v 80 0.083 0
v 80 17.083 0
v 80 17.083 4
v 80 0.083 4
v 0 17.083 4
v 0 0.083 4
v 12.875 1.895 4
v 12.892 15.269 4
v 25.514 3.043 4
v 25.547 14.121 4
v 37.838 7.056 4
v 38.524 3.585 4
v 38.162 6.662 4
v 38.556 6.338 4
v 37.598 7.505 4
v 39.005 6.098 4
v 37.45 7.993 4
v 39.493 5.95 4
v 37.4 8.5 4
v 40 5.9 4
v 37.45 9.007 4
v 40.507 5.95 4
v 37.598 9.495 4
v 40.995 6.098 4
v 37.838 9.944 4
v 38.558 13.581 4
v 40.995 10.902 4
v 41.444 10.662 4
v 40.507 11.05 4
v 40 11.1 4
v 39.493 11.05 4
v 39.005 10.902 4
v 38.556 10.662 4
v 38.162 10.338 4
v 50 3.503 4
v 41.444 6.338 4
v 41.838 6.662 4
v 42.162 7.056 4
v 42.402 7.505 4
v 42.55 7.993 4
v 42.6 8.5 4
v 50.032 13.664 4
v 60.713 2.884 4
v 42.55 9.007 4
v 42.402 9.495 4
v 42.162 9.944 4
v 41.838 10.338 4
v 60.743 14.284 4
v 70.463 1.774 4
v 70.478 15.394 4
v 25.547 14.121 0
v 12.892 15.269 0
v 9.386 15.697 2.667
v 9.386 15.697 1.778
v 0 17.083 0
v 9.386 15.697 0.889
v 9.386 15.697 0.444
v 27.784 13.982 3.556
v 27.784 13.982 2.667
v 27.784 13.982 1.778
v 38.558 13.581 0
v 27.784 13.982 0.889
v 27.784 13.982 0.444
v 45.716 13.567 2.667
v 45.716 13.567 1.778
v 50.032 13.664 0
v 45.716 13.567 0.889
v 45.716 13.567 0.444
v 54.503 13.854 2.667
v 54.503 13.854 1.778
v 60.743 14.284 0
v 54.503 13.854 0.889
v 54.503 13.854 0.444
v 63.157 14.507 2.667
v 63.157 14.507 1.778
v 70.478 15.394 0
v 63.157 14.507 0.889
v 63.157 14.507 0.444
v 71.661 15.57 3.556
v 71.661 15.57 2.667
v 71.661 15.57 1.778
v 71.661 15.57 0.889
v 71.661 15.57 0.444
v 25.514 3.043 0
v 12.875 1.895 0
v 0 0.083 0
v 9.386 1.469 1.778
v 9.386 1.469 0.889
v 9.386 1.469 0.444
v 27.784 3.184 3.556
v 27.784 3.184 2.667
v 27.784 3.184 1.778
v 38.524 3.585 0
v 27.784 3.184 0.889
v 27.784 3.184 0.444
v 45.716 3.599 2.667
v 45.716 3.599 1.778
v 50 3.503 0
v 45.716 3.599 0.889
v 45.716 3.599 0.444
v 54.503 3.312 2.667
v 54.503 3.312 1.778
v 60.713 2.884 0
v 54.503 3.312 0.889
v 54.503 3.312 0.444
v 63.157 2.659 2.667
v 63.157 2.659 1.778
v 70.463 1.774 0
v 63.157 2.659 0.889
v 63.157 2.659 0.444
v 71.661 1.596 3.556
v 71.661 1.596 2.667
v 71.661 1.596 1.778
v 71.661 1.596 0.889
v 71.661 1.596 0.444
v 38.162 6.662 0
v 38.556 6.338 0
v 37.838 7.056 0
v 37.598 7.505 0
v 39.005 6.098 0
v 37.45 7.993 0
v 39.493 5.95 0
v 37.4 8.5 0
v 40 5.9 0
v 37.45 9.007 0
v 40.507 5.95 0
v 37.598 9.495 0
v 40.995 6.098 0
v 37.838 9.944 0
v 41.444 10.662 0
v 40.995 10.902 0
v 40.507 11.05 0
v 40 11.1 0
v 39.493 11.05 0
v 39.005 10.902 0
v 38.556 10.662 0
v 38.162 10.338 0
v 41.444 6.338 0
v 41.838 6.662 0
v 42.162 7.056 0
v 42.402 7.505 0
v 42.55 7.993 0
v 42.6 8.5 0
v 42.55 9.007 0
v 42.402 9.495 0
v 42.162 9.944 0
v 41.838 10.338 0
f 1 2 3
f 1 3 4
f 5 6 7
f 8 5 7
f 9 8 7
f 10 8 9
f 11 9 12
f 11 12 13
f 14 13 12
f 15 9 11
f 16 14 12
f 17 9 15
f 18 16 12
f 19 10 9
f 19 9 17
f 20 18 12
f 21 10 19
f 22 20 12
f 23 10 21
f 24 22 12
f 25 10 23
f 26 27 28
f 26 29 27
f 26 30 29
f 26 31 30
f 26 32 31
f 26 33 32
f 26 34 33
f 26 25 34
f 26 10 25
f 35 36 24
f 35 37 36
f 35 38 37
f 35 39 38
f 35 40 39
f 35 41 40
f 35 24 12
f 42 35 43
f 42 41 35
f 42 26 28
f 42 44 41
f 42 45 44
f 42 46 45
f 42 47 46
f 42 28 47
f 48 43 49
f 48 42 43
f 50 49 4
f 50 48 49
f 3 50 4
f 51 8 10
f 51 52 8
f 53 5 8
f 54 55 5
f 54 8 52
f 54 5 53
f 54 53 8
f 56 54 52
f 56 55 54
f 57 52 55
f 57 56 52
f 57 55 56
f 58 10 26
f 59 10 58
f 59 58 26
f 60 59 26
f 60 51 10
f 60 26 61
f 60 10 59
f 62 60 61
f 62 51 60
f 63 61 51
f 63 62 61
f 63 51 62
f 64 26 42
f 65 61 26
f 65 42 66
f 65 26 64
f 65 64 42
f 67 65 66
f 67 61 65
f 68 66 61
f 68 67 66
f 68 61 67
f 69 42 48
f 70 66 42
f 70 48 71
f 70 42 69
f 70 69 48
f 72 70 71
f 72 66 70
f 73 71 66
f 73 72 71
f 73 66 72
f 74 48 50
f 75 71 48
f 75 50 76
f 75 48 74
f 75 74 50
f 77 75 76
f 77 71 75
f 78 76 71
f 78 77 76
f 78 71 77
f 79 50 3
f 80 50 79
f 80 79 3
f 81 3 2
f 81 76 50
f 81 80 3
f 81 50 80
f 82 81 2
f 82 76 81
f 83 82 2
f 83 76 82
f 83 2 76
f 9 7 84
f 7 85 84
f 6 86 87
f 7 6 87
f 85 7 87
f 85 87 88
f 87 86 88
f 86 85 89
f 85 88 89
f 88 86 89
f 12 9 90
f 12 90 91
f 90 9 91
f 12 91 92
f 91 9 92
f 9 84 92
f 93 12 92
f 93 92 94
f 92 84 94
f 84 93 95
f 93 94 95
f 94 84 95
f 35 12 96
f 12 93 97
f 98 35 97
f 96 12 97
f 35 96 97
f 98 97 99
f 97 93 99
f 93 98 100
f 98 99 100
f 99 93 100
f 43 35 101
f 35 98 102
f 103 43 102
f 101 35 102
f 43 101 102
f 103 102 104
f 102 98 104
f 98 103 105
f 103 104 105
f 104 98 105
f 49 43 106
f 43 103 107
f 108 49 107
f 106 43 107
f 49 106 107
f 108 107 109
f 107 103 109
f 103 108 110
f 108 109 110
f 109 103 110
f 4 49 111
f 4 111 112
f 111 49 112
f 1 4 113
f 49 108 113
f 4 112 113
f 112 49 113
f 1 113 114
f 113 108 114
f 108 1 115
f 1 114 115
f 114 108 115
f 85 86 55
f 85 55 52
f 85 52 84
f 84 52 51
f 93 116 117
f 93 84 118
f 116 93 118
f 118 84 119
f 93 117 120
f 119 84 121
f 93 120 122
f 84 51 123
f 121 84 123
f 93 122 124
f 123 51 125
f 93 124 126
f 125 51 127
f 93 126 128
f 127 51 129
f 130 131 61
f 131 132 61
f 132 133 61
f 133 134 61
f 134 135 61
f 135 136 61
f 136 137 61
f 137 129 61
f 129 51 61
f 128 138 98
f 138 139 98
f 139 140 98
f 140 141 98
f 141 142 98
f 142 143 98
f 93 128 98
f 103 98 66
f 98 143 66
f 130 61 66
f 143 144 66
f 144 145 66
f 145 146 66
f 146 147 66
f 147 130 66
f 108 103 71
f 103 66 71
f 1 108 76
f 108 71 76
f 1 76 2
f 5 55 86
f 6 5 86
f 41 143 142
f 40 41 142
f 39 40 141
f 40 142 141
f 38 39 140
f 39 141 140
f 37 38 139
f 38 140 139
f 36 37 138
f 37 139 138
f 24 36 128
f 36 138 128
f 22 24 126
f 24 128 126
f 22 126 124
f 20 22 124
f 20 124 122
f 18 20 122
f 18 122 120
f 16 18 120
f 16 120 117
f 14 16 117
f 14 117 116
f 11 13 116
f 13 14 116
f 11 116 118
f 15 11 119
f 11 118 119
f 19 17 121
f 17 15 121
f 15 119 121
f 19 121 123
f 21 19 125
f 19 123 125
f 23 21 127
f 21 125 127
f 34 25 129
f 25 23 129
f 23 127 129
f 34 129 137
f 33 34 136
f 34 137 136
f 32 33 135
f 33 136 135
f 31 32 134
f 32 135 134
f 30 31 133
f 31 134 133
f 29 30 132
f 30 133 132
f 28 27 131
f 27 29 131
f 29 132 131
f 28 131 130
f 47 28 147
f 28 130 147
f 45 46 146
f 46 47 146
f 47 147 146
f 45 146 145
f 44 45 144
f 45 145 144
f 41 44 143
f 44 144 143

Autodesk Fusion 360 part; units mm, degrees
sketch "Sketch1" plane through (0, 0, 0) normal (0, 0, 1) x (1, 0, 0)
  spline S0 degree 5 poles (0, 0.083) (3.4028, 0.6487) (10.1655, 1.6592) (20.1813, 2.8133) (33.3011, 3.6916) (49.3449, 3.7981) (61.865, 3.0163) (71.0307, 1.8175) (77.0289, 0.7123) (80, 0.083) knots 0 0 0 0 0 0 0.2 0.4 0.6 0.8 1 1 1 1 1 1
  line L0 (72.4946, 1.6726) -> (87.5054, -1.5065)
  line L1 (-8.6308, -1.3517) -> (8.6308, 1.5177)
  spline S1 degree 5 poles (0, 17.083) (3.4028, 16.5174) (10.1655, 15.5068) (20.1813, 14.3528) (33.3011, 13.4745) (49.3449, 13.368) (61.865, 14.1497) (71.0307, 15.3485) (77.0289, 16.4538) (80, 17.083) knots 0 0 0 0 0 0 0.2 0.4 0.6 0.8 1 1 1 1 1 1
  line L2 (-8.6308, 18.5177) -> (8.6308, 15.6483)
  line L3 (72.4946, 15.4935) -> (87.5054, 18.6726)
  line L4 (80, 17.083) -> (80, 0.083)
  line L5 (0, 17.083) -> (0, 0.083)
  circle A0 centre (40, 8.5) radius 2.6
  dimension "d13" = 5.2
  dimension "d14" = 40
  dimension "d15" = 40
  dimension "d18" = 17
  dimension "d21" = 17
  dimension "d22" = 8.5
extrude "Extrude4" add sketch "Sketch1" along normal blind 4
extrude "Extrude2" [suppressed]
extrude "Extrude3" [suppressed]
equation "d22 = ( 17 / 2 ) * 1 mm"
